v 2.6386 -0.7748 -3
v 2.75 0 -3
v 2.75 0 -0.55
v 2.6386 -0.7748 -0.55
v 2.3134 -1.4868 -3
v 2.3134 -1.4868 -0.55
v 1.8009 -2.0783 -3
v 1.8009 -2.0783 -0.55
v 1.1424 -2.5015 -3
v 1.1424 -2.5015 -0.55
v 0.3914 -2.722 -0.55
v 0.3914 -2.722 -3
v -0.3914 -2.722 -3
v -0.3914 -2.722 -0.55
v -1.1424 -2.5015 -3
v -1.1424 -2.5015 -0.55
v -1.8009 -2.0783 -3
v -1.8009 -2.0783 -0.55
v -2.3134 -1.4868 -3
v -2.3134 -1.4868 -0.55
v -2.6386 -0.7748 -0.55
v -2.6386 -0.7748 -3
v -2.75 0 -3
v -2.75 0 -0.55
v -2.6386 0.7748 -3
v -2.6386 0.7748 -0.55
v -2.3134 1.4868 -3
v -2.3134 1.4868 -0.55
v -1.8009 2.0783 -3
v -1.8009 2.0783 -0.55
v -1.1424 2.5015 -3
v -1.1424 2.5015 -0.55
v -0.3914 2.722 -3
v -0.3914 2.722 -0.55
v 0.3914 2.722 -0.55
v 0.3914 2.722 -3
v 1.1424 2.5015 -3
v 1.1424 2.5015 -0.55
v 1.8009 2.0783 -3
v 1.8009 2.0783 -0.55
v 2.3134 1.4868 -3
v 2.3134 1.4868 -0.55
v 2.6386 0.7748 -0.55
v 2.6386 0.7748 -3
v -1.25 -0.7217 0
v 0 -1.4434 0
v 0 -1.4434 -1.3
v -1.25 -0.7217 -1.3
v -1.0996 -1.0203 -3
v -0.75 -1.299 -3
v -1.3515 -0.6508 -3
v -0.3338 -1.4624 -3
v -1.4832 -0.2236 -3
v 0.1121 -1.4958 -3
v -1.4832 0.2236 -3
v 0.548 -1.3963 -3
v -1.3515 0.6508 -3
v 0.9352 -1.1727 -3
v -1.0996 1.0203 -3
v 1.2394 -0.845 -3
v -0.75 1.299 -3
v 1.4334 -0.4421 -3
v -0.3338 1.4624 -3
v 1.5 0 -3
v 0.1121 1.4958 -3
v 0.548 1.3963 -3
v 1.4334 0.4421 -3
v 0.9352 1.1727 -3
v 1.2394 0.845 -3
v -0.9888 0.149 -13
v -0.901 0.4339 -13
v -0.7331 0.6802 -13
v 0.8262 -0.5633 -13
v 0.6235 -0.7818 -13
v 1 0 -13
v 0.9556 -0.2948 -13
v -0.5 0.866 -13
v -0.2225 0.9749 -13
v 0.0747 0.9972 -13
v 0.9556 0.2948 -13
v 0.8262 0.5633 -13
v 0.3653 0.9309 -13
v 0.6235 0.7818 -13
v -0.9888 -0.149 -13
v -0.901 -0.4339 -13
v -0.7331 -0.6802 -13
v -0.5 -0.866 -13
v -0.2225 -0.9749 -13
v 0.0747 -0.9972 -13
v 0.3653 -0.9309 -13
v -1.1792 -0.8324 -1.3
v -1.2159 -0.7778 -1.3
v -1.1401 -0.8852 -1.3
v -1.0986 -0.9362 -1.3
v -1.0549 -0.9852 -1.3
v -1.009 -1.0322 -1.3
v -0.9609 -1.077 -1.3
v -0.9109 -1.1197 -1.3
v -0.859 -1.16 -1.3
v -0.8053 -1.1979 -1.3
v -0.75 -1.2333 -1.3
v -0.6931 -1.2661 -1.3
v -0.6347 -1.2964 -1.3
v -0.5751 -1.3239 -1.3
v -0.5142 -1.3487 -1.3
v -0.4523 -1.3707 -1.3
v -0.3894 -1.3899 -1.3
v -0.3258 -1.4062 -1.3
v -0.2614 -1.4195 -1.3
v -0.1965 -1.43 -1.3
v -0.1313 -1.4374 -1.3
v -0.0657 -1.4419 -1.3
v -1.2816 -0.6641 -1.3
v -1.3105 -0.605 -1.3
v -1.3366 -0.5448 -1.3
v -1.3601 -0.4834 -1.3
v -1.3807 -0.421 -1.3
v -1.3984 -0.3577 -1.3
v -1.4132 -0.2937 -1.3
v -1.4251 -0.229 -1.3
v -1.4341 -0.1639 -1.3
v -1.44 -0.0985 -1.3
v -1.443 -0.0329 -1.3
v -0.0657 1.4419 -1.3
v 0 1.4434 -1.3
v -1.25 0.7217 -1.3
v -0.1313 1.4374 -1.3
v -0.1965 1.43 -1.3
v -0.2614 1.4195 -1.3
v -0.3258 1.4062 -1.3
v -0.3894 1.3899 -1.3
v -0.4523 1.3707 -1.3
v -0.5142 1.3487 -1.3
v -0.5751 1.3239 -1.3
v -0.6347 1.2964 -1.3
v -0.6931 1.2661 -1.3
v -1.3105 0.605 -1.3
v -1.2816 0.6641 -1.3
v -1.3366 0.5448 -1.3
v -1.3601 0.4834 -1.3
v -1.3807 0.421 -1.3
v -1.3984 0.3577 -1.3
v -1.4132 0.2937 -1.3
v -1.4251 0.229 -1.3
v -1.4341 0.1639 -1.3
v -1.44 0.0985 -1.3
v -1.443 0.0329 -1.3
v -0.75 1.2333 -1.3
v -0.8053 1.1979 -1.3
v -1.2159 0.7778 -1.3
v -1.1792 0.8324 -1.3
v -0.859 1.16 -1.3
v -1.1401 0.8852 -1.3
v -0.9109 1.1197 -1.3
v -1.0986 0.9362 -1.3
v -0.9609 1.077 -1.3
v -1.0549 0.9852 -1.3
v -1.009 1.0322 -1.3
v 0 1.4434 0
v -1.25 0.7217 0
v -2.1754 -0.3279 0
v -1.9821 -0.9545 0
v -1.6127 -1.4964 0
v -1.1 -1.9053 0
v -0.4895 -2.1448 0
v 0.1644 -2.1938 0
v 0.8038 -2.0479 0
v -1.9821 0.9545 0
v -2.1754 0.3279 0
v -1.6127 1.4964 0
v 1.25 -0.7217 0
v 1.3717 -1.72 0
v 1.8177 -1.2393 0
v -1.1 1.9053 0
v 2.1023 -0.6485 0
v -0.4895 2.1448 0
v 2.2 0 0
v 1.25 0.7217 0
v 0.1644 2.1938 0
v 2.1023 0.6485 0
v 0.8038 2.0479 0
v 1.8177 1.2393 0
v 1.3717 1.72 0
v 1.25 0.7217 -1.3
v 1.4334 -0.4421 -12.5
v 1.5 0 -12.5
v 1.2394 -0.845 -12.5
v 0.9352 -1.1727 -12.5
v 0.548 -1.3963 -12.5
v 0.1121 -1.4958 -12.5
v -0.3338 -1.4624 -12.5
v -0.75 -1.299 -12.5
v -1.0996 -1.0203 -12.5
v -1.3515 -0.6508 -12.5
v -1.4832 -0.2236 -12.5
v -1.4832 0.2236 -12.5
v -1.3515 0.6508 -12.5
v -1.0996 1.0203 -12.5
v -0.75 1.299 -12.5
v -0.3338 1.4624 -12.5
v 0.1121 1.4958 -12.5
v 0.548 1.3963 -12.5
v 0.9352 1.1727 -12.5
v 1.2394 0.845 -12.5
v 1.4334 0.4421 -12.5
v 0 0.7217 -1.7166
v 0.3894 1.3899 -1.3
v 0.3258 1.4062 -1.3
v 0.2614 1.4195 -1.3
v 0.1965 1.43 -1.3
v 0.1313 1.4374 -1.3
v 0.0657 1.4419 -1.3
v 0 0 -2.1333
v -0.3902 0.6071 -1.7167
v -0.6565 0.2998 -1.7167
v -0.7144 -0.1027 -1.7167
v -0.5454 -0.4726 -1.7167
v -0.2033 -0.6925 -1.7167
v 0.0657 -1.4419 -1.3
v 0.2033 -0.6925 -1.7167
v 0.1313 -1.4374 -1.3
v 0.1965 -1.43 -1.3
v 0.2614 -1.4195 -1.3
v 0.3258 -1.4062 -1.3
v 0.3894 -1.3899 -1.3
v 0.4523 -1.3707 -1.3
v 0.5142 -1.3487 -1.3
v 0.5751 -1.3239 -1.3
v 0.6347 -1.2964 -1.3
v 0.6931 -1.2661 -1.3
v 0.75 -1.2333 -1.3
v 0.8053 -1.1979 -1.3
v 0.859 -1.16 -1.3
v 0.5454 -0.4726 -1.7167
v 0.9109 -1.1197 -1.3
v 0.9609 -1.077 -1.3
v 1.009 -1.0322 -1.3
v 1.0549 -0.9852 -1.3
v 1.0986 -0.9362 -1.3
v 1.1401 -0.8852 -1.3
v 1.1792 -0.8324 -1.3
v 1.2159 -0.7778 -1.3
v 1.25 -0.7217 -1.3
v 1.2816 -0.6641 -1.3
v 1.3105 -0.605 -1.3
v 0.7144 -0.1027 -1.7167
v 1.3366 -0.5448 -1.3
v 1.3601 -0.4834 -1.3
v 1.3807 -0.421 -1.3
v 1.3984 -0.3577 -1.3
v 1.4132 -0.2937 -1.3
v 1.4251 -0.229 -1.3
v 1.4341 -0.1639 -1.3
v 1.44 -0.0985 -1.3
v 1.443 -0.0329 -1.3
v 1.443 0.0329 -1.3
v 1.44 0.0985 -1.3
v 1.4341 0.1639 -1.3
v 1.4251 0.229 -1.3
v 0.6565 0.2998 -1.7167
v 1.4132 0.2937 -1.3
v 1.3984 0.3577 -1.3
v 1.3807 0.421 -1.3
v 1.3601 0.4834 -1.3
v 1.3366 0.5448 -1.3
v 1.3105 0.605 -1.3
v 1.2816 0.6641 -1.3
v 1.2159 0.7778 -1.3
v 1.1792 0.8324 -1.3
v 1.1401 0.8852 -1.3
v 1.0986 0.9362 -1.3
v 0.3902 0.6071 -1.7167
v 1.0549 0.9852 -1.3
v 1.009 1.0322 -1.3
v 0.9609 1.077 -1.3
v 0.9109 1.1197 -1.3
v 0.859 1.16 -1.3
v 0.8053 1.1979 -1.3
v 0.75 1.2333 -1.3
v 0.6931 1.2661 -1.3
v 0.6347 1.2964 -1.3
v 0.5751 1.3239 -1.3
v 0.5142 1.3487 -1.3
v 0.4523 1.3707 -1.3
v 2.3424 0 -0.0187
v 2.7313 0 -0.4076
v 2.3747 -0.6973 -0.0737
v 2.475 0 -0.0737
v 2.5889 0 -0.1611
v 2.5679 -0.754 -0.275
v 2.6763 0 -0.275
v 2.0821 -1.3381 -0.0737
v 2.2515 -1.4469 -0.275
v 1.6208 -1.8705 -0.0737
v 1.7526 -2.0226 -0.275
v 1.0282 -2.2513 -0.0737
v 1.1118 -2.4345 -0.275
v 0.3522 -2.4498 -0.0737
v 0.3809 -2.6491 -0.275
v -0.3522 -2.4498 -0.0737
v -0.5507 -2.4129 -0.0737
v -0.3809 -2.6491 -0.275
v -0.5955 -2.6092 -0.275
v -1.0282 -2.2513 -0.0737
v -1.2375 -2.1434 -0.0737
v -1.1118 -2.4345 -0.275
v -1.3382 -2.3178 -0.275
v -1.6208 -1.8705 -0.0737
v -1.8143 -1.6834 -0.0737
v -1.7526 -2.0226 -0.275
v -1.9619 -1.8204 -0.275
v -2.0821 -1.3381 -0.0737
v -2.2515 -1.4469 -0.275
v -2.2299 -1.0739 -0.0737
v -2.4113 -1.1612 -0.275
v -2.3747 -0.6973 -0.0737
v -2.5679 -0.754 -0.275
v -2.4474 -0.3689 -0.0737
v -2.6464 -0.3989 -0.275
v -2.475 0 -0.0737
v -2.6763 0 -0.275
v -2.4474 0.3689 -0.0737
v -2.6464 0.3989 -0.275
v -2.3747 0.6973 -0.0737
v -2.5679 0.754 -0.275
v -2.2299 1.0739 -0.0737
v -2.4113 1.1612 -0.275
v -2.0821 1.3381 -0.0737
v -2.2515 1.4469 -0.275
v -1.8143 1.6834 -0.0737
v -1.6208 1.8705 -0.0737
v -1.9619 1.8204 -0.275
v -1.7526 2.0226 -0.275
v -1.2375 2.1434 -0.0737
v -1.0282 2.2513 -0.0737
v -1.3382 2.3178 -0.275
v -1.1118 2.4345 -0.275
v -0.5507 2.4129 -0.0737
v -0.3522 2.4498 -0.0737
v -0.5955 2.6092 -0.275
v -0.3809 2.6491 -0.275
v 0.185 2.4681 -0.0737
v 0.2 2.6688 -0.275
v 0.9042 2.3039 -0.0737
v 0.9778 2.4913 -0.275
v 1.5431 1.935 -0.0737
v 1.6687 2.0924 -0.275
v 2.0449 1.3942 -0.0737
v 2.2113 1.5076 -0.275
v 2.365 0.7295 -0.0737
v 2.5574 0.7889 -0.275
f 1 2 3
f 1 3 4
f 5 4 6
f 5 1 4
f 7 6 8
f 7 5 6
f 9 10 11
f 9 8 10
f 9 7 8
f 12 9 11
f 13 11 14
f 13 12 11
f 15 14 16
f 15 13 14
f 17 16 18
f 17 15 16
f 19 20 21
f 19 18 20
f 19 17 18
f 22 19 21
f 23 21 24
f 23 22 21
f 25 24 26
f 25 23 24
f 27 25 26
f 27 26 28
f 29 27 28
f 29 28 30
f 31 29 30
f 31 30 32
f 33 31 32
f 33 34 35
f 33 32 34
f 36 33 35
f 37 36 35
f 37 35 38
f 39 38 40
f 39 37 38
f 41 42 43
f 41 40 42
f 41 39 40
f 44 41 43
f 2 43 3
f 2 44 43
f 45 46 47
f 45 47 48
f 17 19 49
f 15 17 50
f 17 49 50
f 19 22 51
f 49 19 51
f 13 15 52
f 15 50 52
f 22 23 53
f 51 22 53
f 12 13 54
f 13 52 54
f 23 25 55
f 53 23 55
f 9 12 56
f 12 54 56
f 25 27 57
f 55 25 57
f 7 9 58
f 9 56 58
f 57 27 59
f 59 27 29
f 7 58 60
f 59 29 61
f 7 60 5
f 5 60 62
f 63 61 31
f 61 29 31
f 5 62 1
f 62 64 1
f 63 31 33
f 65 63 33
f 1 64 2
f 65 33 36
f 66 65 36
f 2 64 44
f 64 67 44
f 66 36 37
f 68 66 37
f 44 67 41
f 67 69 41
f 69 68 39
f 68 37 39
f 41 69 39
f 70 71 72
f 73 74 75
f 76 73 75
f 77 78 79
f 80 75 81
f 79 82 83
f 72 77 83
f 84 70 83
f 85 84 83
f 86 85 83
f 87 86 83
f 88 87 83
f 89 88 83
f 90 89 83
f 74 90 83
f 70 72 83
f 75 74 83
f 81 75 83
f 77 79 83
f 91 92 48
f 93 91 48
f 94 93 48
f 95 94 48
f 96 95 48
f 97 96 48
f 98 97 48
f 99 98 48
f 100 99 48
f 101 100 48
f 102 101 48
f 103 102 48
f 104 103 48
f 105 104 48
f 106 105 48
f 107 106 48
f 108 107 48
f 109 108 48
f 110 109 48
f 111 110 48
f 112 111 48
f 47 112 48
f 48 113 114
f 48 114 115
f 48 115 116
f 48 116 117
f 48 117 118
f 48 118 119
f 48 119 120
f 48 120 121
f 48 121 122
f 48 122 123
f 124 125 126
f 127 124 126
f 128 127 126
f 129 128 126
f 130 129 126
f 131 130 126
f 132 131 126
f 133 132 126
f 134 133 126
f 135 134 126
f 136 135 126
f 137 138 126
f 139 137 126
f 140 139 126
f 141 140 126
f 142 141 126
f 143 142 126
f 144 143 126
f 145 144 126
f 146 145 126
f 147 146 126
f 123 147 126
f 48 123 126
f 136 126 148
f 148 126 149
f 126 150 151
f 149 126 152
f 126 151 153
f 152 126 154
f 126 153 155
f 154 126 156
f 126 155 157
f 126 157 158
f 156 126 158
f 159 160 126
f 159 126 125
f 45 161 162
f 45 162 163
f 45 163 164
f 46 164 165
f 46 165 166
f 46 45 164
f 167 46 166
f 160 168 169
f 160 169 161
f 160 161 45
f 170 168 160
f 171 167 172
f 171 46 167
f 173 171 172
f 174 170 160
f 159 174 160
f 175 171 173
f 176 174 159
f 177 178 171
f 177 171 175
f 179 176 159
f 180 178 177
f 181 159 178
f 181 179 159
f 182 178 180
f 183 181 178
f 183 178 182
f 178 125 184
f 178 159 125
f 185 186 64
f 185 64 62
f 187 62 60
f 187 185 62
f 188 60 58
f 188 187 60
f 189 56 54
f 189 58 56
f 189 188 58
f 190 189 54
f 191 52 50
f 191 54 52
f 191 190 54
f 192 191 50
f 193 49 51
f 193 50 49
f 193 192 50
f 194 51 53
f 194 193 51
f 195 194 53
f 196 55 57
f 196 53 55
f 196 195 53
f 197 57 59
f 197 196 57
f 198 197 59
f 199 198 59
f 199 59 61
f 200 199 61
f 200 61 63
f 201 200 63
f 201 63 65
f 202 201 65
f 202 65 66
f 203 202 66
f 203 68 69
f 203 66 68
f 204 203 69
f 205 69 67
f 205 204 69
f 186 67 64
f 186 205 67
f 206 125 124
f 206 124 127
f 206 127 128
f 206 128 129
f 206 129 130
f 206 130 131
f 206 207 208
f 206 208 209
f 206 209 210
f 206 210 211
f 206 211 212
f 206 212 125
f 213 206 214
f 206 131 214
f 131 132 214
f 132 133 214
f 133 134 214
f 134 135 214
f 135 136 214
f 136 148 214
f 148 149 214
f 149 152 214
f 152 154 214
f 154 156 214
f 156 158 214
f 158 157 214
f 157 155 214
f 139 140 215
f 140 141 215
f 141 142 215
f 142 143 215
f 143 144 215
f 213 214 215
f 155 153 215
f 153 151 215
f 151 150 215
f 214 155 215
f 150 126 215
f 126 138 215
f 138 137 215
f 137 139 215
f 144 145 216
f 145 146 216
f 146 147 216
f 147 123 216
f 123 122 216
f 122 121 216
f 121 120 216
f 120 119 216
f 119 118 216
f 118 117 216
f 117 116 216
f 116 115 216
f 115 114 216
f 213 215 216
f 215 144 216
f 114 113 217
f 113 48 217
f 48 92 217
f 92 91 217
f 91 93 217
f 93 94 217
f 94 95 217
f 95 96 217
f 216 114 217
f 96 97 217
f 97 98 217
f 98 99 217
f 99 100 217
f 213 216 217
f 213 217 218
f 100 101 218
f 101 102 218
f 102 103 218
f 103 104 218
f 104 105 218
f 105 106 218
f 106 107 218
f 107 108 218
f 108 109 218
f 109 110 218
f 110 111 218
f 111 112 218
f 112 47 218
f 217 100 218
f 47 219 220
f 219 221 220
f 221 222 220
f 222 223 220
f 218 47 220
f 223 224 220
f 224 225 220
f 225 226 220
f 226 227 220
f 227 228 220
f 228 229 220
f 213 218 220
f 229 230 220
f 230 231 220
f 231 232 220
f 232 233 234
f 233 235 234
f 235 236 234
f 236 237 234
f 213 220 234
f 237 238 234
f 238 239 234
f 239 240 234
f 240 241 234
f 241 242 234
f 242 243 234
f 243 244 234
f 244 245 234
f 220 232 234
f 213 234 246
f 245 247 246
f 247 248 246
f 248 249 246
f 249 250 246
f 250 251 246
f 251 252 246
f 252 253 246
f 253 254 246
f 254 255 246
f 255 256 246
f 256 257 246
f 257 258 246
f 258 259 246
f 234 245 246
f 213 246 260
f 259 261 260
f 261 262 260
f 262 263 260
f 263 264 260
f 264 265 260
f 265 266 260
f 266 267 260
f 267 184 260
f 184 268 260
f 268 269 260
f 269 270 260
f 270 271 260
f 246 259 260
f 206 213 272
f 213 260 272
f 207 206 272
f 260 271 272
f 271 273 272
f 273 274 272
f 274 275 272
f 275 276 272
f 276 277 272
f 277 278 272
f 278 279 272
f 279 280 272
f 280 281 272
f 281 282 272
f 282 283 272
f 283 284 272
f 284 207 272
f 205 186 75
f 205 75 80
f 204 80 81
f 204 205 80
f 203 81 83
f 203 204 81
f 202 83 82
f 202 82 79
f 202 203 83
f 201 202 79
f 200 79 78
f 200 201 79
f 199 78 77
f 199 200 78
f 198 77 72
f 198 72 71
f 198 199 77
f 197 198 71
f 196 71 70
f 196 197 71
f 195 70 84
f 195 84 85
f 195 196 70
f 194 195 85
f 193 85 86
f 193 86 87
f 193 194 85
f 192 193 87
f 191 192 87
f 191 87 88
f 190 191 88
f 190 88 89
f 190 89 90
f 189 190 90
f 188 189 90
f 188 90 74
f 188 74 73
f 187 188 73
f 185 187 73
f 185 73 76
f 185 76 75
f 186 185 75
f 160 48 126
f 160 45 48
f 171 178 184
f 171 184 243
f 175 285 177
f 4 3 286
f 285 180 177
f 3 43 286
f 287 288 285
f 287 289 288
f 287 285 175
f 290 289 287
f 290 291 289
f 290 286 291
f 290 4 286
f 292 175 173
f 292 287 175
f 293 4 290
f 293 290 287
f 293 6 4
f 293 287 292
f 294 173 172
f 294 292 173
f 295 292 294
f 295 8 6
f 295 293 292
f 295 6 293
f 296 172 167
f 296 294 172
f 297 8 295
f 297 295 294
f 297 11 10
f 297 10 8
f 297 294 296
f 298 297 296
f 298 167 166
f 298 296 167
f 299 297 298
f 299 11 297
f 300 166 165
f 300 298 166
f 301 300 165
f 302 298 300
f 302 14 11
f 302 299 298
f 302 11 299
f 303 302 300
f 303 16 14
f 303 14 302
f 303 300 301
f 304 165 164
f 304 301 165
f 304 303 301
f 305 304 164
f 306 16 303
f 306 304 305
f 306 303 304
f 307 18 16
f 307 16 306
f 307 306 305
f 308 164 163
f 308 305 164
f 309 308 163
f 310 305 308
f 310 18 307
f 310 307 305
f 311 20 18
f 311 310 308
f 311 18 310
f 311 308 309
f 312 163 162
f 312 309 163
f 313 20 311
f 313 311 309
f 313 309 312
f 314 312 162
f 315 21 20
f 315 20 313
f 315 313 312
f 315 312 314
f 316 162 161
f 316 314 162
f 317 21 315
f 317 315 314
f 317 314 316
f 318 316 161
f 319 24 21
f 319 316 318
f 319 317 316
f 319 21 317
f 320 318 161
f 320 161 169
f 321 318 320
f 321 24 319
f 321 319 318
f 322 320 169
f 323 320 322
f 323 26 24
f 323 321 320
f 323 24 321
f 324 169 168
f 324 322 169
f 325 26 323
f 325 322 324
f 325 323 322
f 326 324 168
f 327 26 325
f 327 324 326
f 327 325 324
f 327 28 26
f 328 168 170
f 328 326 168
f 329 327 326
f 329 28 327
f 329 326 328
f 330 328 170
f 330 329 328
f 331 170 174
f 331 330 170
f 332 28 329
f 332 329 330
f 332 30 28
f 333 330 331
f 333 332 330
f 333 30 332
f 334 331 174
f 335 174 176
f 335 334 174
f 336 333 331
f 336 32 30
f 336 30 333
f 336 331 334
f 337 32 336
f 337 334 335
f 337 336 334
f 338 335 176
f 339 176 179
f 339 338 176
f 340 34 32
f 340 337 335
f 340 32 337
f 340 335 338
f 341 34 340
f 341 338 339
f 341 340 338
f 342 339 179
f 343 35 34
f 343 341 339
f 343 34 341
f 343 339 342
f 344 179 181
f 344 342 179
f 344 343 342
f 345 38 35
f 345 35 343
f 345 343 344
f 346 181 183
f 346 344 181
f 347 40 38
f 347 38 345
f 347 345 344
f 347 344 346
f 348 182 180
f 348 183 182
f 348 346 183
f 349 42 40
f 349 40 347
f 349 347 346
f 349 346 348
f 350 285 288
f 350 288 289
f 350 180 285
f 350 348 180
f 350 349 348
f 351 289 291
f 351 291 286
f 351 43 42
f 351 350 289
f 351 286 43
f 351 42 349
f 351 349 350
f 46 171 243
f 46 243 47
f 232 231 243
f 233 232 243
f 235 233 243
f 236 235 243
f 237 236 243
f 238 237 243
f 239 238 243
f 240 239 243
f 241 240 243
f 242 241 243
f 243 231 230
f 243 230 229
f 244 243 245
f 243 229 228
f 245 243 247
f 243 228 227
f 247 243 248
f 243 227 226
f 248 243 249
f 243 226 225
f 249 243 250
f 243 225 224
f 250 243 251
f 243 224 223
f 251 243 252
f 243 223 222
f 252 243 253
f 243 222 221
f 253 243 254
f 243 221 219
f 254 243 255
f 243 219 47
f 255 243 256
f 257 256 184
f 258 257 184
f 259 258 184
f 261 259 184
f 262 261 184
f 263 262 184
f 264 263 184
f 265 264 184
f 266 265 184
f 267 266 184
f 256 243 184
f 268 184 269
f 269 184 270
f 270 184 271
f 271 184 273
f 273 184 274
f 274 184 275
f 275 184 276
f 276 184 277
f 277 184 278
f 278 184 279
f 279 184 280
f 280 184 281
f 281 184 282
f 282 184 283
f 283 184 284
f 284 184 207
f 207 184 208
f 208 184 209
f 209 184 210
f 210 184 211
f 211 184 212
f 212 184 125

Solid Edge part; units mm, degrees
sketch "Sketch1" plane through (0, 0, 0) normal (0, -1, 0) x (1, 0, 0)
  line L0 (0, 0) -> (2.2, 0)
  arc A0 (2.2, 0) -> (2.75, -0.55) centre (2.2, -0.55) cw
  line L1 (2.75, -0.55) -> (2.75, -3)
  line L2 (2.75, -3) -> (1.5, -3)
  line L3 (1.5, -3) -> (1.5, -12.5)
  line L4 (1.5, -12.5) -> (1, -13)
  line L5 (1, -13) -> (0, -13)
revolve "RevolvedProtrusion1" add sketch "Sketch1" angle 360 about axis through (0, 0, -13) along (0, 0, 1)
sketch "Sketch2" plane through (0, 0, 0) normal (0, 0, 1) x (1, 0, 0)
  line L0 (-1.25, -0.7217) -> (-1.25, 0.7217)
  line L1 (-1.25, 0.7217) -> (0, 1.4434)
  line L2 (0, 1.4434) -> (1.25, 0.7217)
  line L3 (1.25, 0.7217) -> (1.25, -0.7217)
  line L4 (1.25, -0.7217) -> (0, -1.4434)
  line L5 (0, -1.4434) -> (-1.25, -0.7217)
extrude "Cutout1" cut sketch "Sketch2" against normal blind 1.3
sketch "Sketch3" plane through (0, 0, 0) normal (1, 0, 0) x (0, 1, 0)
  line L0 (0, -2.1333) -> (1.4434, -1.3)
  line L1 (0, -1.3) -> (1.4434, -1.3)
  line L2 (0, -1.3) -> (0, -2.1333)
revolve "RevolvedCutout1" cut sketch "Sketch3" angle 360 about axis through (0, 0, -60.325) along (0, 0, 1)
cosmetic_thread "Thread1" size "M3"
properties part number "26"
